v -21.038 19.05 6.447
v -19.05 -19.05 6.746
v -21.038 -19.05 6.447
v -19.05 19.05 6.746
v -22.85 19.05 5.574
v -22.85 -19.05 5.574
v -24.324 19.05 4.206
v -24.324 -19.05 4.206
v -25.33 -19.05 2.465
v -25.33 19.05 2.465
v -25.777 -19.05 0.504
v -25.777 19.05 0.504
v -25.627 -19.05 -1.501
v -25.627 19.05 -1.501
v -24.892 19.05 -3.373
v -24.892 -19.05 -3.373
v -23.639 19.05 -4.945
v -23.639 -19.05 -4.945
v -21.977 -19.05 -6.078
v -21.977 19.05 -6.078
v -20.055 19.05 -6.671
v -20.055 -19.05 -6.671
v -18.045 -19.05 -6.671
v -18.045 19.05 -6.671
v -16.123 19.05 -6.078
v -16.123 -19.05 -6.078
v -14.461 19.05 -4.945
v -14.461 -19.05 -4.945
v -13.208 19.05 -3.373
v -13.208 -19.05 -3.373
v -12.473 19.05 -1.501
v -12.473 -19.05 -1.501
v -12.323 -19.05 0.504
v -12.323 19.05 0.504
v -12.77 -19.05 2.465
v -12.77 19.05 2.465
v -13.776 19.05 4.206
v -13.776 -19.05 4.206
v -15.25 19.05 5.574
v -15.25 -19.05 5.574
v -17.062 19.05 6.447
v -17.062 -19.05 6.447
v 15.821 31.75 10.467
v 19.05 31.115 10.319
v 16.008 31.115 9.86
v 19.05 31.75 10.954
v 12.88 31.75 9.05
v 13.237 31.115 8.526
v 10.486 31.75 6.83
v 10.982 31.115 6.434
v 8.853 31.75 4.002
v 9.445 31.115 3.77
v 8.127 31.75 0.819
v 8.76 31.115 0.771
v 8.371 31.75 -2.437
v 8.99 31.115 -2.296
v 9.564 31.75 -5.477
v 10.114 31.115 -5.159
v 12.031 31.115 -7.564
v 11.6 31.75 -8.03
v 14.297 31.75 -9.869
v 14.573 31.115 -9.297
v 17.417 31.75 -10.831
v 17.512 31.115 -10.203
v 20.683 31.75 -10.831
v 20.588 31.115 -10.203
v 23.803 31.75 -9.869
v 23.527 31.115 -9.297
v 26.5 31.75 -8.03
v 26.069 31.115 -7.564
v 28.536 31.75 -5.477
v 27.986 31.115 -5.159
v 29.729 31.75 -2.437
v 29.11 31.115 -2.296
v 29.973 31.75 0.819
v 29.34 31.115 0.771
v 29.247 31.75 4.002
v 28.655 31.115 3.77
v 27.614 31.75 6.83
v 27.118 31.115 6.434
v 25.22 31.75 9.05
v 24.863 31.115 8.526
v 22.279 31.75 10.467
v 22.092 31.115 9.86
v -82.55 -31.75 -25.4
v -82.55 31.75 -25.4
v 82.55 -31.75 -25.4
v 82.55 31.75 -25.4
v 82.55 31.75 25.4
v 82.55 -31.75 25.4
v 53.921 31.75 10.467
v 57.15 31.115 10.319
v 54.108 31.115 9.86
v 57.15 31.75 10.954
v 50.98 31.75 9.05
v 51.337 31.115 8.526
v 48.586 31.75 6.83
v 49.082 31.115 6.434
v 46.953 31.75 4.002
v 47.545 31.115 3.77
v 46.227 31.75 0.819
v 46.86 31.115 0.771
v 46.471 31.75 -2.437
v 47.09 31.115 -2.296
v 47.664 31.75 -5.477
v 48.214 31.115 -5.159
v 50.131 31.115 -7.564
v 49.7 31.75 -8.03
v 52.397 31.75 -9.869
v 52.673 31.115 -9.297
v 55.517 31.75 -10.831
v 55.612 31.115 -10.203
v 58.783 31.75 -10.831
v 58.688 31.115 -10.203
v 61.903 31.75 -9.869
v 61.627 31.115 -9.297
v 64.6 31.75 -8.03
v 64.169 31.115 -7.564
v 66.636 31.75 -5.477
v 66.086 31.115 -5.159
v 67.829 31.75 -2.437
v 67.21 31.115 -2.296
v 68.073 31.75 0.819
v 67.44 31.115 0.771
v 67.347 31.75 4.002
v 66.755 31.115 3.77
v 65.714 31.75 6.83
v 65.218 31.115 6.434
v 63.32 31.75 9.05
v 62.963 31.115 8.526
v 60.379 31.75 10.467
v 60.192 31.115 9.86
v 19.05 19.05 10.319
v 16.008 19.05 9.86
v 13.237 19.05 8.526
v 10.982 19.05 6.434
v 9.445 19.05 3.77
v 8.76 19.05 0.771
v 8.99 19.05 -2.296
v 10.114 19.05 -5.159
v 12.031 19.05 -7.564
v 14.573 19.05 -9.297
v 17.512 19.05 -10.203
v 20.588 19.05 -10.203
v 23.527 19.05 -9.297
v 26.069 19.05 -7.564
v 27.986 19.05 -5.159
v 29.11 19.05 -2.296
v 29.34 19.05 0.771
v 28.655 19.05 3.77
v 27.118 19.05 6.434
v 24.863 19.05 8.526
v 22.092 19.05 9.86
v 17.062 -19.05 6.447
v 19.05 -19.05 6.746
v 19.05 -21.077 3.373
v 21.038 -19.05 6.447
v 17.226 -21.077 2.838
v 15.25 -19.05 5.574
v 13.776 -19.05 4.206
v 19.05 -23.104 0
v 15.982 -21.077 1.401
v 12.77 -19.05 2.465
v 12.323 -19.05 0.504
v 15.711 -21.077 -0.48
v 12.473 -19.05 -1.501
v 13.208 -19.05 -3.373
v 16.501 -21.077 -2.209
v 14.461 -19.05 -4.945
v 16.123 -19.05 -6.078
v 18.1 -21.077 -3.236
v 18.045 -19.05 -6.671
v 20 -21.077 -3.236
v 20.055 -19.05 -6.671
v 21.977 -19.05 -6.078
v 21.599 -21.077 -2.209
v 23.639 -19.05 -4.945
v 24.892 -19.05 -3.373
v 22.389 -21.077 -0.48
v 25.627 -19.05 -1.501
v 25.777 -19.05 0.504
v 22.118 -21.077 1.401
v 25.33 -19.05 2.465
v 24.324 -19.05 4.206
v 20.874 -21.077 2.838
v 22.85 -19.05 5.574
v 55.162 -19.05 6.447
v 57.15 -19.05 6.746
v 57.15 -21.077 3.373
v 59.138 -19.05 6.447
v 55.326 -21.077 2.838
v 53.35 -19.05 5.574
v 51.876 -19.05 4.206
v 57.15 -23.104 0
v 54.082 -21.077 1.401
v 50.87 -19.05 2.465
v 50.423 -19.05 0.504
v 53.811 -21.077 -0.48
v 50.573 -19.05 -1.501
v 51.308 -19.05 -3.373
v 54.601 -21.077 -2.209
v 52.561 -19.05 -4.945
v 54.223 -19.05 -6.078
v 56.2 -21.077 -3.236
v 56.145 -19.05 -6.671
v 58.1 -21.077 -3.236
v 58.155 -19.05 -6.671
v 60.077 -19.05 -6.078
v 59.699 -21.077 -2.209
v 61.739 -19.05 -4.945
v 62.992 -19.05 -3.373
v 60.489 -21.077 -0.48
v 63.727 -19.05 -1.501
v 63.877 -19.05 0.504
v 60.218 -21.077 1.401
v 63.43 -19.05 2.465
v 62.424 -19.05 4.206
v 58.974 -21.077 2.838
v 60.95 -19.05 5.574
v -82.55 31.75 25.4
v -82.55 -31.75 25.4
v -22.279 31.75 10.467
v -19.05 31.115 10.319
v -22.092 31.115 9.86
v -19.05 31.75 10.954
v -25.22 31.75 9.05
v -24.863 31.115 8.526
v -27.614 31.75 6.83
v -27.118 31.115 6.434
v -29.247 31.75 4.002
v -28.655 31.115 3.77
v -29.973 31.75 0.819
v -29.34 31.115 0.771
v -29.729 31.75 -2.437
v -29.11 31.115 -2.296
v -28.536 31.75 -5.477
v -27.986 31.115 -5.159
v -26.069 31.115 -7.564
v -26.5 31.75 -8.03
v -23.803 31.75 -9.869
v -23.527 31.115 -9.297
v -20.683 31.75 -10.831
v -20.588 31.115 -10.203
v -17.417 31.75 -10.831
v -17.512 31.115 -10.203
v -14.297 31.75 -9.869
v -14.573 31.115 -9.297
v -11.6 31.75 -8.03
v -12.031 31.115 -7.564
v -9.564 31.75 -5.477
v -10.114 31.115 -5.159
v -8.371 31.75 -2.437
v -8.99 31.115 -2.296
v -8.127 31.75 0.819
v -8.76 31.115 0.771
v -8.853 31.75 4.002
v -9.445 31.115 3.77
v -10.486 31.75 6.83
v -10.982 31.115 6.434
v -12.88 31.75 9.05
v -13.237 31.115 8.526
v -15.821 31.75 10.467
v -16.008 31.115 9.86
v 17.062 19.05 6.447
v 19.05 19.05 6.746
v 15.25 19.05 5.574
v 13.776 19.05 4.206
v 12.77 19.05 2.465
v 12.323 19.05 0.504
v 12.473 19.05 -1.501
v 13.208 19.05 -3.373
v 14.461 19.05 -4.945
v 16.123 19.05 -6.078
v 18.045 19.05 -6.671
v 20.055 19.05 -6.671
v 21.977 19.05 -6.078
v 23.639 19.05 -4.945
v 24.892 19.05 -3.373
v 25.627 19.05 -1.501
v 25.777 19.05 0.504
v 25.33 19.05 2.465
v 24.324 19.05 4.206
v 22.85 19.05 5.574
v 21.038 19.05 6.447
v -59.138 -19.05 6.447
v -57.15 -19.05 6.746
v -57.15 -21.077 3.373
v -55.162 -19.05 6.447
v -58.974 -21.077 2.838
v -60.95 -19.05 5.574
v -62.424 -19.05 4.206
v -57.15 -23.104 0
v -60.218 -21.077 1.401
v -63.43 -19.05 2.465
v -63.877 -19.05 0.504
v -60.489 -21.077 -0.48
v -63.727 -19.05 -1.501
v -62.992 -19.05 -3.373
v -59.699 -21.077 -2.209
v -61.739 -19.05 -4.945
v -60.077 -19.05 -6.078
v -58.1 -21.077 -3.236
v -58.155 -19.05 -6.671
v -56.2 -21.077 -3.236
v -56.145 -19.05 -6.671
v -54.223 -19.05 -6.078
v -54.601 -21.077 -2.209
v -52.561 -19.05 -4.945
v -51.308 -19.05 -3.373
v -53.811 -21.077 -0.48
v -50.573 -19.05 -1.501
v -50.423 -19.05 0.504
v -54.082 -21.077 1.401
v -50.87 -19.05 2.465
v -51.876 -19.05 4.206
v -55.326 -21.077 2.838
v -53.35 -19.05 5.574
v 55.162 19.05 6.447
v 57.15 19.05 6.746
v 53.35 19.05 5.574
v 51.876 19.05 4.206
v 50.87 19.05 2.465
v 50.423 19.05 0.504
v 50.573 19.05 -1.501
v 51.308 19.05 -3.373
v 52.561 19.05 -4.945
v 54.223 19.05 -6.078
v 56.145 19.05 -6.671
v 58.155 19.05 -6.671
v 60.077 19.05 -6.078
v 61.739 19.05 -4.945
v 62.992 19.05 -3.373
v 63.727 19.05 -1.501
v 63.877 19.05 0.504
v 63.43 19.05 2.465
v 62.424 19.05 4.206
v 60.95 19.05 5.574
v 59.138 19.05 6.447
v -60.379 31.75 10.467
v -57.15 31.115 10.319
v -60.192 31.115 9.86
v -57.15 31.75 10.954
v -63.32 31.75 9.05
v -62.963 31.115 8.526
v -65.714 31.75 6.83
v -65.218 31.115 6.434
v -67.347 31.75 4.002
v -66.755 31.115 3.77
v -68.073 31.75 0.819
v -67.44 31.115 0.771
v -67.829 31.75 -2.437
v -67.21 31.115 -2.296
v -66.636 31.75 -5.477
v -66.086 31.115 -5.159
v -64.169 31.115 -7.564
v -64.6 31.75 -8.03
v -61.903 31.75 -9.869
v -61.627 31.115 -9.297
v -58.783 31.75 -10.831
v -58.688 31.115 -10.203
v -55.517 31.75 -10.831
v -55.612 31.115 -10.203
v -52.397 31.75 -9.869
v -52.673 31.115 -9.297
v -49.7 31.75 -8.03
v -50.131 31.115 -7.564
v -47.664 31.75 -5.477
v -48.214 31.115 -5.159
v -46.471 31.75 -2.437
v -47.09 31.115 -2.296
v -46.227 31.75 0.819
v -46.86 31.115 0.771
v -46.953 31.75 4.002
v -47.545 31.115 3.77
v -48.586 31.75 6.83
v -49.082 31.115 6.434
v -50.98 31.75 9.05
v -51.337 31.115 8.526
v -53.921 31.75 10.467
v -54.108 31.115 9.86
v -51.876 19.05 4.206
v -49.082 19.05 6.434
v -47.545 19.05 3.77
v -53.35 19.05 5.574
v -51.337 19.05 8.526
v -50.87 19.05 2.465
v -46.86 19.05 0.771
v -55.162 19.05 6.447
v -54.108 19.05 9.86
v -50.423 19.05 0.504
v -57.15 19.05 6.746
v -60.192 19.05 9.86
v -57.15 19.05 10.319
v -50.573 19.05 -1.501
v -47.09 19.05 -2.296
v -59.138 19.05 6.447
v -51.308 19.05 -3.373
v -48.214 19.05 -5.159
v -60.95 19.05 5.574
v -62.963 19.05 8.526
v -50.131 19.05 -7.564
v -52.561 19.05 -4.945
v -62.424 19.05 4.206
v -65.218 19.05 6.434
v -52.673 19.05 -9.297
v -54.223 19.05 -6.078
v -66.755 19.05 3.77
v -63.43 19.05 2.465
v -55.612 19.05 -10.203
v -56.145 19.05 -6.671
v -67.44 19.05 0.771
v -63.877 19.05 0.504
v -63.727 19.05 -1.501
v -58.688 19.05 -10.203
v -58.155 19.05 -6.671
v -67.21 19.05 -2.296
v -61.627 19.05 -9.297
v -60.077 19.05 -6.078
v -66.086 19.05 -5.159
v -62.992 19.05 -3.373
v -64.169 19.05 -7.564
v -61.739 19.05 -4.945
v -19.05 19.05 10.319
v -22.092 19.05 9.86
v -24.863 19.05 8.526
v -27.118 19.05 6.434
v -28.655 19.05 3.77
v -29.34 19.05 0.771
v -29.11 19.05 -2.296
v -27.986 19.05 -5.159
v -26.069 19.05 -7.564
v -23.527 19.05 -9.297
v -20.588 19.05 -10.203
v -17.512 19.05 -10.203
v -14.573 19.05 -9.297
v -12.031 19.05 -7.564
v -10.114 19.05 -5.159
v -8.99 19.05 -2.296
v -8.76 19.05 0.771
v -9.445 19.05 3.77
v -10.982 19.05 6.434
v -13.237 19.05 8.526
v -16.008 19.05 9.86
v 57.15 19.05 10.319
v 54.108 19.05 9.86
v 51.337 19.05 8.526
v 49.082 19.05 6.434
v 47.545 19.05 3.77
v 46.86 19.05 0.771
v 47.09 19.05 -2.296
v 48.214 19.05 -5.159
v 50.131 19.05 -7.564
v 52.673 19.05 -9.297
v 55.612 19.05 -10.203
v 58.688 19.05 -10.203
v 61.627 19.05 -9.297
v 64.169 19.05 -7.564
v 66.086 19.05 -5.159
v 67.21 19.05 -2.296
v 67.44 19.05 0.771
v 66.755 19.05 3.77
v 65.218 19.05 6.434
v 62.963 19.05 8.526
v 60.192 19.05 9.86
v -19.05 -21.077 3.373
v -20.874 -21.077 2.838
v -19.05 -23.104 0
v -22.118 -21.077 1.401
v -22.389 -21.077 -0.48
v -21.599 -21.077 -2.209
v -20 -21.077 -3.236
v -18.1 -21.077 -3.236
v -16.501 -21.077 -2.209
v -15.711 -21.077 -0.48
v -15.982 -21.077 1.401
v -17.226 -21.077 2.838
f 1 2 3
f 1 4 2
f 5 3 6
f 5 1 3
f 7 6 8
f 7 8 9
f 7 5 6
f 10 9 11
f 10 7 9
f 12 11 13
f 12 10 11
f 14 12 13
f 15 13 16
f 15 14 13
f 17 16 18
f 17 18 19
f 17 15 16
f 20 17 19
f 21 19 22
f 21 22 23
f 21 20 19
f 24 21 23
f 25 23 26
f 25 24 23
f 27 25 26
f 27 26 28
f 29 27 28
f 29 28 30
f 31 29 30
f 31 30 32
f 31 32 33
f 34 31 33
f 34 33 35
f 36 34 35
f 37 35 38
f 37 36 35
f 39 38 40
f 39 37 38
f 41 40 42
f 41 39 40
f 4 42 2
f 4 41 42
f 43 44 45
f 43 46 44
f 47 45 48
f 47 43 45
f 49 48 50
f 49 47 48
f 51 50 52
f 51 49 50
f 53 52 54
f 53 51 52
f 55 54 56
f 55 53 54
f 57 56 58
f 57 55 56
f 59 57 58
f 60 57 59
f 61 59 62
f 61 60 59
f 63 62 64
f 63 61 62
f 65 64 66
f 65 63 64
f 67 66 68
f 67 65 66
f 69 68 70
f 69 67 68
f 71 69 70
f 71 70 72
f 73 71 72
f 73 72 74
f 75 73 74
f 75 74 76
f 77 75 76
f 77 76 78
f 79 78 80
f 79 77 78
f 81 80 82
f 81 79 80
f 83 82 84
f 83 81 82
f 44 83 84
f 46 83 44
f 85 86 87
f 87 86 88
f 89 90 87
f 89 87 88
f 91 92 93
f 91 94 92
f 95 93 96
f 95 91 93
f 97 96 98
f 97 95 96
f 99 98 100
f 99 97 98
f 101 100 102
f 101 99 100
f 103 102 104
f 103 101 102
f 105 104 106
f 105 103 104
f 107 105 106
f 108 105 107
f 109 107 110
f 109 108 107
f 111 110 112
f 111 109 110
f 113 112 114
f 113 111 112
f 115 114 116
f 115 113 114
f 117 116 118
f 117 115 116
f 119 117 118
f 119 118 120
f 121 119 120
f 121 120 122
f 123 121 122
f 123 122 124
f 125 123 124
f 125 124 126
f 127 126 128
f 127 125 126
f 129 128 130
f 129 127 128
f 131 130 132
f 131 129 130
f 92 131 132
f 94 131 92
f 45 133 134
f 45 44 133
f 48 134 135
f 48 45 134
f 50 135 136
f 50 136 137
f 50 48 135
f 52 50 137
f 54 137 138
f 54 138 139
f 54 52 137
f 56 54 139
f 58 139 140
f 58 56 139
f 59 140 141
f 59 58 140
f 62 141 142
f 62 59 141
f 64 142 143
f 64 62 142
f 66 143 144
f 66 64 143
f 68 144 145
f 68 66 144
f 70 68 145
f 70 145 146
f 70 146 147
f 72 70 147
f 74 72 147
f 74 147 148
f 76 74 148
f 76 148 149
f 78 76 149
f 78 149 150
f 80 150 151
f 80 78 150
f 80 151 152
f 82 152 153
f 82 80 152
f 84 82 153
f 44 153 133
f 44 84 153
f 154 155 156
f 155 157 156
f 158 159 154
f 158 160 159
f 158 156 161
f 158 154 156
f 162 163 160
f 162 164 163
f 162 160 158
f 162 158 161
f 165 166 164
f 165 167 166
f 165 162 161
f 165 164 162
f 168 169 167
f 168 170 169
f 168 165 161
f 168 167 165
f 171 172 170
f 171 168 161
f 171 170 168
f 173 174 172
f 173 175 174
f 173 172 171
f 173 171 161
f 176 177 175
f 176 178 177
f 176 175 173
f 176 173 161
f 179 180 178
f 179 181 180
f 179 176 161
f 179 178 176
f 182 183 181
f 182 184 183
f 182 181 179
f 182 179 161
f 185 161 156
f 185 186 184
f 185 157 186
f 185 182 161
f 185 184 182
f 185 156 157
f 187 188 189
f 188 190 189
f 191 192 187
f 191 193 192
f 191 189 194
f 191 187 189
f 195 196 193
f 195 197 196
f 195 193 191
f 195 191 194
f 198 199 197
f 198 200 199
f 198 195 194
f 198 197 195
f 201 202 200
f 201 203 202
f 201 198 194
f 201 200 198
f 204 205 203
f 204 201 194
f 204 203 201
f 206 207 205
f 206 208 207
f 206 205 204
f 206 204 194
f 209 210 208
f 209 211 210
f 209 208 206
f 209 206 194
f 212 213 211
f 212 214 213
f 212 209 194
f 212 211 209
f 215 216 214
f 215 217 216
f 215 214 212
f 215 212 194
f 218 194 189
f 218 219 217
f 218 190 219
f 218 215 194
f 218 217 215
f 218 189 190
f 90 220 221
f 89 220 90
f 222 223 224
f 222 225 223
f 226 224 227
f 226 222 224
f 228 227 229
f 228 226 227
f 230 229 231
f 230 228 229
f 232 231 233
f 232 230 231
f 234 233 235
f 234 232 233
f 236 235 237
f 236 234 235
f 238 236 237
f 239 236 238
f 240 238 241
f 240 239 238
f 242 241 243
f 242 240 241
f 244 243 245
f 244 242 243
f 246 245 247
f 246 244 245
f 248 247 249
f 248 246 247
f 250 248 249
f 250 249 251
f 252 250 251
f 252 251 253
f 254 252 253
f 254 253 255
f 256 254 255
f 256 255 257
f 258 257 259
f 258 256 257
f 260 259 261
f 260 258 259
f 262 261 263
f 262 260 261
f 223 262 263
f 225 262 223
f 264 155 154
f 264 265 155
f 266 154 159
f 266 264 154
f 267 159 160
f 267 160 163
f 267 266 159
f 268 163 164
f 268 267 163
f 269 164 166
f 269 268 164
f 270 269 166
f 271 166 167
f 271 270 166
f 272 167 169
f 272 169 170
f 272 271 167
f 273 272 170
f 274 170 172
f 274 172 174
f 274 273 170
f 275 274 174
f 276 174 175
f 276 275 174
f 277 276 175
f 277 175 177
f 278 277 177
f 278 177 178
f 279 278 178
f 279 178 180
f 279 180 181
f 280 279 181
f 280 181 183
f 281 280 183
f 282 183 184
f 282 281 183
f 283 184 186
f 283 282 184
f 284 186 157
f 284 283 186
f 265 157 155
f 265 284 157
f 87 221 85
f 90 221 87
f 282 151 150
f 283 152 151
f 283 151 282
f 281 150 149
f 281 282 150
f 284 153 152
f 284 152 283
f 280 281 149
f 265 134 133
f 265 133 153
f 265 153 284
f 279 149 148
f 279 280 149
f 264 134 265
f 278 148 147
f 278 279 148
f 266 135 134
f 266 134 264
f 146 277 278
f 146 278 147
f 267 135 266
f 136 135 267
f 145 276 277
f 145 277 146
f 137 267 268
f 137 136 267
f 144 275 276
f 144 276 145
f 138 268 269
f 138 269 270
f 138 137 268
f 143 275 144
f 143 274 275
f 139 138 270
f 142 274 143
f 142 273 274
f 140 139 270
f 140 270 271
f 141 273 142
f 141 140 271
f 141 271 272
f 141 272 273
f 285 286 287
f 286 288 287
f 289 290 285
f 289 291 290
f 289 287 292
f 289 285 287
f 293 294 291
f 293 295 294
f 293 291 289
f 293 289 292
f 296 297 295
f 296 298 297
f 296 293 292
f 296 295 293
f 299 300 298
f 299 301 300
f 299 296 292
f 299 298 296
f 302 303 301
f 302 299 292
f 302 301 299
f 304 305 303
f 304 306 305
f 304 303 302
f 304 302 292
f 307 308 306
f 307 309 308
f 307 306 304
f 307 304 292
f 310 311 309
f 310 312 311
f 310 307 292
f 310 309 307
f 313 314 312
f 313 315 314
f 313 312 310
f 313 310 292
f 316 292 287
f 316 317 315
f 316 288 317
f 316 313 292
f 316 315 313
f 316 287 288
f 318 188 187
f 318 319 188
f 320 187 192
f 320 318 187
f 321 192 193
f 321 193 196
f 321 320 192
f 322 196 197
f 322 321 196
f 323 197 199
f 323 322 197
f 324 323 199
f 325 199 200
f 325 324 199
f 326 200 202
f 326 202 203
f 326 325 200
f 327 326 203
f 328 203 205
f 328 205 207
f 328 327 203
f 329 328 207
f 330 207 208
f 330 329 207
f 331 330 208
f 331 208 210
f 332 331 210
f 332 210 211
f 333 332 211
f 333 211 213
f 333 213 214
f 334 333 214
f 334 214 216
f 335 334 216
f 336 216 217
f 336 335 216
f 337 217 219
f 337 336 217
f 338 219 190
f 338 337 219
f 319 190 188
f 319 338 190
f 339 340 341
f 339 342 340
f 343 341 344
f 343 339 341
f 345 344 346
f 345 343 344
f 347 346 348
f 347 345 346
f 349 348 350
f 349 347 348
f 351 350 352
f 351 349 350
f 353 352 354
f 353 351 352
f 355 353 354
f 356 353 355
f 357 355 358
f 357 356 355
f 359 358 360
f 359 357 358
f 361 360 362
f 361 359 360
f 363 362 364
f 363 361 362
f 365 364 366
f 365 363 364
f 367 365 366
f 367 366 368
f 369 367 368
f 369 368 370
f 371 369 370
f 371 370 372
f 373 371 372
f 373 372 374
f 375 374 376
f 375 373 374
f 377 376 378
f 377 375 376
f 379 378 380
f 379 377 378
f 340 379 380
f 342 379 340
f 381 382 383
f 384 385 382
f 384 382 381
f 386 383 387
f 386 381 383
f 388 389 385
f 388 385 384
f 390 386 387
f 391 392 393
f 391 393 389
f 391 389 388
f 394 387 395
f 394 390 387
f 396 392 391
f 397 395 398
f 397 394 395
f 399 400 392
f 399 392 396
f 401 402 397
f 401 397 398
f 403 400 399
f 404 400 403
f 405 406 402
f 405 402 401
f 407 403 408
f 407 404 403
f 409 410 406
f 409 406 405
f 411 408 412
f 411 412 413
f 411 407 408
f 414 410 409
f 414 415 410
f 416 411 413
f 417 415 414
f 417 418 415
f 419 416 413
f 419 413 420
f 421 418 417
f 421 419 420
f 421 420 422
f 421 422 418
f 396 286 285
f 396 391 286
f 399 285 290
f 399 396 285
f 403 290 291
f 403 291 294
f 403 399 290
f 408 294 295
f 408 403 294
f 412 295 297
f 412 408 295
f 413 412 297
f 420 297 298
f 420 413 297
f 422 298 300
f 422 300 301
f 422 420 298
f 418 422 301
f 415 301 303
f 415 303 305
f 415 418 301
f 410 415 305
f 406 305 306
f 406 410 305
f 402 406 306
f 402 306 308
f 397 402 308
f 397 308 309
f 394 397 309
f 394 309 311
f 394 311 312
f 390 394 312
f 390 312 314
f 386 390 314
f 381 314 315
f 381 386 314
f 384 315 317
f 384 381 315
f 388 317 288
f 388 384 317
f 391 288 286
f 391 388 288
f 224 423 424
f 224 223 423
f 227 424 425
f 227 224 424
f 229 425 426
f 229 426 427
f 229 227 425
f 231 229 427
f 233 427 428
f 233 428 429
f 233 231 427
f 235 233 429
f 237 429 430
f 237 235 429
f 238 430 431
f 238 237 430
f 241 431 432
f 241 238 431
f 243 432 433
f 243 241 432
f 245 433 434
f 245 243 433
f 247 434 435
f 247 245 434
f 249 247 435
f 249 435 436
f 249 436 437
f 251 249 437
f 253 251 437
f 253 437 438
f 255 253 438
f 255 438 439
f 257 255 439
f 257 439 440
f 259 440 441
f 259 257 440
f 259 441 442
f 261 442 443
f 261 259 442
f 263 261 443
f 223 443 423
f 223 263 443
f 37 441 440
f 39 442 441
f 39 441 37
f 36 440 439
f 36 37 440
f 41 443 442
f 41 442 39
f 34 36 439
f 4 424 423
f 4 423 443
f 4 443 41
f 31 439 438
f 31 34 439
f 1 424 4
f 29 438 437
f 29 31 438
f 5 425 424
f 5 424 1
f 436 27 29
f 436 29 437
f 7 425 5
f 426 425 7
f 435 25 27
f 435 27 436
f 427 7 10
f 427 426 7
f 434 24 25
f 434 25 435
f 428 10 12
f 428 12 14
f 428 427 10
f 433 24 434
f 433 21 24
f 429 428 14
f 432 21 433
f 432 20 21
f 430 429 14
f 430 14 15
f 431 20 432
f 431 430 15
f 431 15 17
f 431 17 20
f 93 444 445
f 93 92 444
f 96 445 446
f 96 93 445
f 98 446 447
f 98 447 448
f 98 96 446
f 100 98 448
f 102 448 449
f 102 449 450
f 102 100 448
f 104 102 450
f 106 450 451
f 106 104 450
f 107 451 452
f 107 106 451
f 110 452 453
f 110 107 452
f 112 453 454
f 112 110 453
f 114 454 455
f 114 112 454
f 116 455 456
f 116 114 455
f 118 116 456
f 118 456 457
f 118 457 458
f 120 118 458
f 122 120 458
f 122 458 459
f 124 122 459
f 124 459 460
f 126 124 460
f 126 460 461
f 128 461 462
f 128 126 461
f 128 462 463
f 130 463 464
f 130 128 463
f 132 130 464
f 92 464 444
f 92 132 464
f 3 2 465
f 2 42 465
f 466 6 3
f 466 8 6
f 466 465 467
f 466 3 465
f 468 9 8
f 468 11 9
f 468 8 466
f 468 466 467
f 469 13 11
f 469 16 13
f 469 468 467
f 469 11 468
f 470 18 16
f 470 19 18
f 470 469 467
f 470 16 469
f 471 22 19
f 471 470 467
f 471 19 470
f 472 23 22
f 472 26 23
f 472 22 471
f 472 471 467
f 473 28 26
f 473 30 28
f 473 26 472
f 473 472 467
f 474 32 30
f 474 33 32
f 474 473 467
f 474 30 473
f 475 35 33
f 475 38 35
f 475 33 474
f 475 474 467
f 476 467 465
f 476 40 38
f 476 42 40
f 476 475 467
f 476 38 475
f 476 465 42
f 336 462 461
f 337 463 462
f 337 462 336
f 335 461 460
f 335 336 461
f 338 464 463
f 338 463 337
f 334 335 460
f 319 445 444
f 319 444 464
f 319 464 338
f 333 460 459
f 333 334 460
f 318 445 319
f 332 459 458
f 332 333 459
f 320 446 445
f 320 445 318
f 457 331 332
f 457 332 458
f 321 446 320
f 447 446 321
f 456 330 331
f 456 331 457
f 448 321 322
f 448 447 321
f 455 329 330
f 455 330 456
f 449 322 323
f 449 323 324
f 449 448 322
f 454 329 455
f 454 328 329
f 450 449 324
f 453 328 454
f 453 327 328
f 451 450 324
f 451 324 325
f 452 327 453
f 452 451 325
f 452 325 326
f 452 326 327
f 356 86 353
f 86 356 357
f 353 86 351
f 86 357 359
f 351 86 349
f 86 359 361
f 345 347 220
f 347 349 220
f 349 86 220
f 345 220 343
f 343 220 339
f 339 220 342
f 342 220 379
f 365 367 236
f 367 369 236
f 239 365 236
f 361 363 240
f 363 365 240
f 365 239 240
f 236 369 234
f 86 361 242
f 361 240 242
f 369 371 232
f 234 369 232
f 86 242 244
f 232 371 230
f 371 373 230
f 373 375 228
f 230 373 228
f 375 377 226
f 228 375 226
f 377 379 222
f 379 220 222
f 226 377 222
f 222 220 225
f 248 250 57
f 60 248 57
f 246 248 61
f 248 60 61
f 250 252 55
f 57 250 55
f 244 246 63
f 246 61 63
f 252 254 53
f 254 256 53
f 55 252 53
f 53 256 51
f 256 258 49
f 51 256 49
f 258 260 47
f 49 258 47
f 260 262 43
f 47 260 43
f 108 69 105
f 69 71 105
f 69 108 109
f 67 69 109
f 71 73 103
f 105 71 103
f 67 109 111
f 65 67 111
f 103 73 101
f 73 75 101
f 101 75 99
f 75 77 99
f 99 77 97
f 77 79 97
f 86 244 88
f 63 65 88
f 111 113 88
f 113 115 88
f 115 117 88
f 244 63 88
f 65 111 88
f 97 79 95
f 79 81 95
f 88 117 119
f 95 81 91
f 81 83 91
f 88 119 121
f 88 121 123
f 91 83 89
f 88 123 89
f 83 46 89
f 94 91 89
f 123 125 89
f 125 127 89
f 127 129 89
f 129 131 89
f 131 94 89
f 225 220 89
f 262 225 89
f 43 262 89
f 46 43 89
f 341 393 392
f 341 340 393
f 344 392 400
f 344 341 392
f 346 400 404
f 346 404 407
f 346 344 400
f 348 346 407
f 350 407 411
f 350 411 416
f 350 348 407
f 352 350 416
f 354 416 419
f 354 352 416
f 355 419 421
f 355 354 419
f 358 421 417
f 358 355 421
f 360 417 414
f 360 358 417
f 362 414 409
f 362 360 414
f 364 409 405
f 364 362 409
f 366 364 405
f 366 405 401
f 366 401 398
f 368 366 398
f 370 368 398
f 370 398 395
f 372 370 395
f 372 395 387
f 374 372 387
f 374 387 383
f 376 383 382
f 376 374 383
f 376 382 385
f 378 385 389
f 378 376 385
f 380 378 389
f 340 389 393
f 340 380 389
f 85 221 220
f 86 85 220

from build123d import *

# Parameters (mm, degrees)
SKETCH1_W           = 165.1
SKETCH1_H           = 63.5
BOSS_EXTRUDE1_DEPTH = 25.4
LPATTERN1_COUNT     = 4
LPATTERN1_PITCH     = 38.1


with BuildPart() as part:
    # Sketch1 → Boss-Extrude1 (new body, symmetric)
    with BuildSketch(Plane.XY):
        Rectangle(SKETCH1_W, SKETCH1_H)
    extrude(amount=BOSS_EXTRUDE1_DEPTH, both=True)

    # Sketch4 → CBORE for 1/2 Socket Head Cap Screw2 (revolve, cut)
    with BuildSketch(Plane(origin=(-57.15, 31.75, 0), x_dir=(0, 0, 1), z_dir=(1, 0, 0))):
        Polygon((0, 0), (0, 54.853549943), (6.74624, 50.8), (6.74624, 12.7), (10.31875, 12.7), (10.31875, 0.635), (10.95375, 0), align=None)
    cbore_for_1_2_socket_head_cap_screw2 = revolve(axis=Axis((-57.15, 38.1, 0), (0, -1, 0)), mode=Mode.SUBTRACT)

    # LPattern1: CBORE for 1/2 Socket Head Cap Screw2 ×4
    with Locations(*[(i * LPATTERN1_PITCH, 0, 0) for i in range(1, LPATTERN1_COUNT)]):
        add(cbore_for_1_2_socket_head_cap_screw2, mode=Mode.SUBTRACT)


solid = part.part
